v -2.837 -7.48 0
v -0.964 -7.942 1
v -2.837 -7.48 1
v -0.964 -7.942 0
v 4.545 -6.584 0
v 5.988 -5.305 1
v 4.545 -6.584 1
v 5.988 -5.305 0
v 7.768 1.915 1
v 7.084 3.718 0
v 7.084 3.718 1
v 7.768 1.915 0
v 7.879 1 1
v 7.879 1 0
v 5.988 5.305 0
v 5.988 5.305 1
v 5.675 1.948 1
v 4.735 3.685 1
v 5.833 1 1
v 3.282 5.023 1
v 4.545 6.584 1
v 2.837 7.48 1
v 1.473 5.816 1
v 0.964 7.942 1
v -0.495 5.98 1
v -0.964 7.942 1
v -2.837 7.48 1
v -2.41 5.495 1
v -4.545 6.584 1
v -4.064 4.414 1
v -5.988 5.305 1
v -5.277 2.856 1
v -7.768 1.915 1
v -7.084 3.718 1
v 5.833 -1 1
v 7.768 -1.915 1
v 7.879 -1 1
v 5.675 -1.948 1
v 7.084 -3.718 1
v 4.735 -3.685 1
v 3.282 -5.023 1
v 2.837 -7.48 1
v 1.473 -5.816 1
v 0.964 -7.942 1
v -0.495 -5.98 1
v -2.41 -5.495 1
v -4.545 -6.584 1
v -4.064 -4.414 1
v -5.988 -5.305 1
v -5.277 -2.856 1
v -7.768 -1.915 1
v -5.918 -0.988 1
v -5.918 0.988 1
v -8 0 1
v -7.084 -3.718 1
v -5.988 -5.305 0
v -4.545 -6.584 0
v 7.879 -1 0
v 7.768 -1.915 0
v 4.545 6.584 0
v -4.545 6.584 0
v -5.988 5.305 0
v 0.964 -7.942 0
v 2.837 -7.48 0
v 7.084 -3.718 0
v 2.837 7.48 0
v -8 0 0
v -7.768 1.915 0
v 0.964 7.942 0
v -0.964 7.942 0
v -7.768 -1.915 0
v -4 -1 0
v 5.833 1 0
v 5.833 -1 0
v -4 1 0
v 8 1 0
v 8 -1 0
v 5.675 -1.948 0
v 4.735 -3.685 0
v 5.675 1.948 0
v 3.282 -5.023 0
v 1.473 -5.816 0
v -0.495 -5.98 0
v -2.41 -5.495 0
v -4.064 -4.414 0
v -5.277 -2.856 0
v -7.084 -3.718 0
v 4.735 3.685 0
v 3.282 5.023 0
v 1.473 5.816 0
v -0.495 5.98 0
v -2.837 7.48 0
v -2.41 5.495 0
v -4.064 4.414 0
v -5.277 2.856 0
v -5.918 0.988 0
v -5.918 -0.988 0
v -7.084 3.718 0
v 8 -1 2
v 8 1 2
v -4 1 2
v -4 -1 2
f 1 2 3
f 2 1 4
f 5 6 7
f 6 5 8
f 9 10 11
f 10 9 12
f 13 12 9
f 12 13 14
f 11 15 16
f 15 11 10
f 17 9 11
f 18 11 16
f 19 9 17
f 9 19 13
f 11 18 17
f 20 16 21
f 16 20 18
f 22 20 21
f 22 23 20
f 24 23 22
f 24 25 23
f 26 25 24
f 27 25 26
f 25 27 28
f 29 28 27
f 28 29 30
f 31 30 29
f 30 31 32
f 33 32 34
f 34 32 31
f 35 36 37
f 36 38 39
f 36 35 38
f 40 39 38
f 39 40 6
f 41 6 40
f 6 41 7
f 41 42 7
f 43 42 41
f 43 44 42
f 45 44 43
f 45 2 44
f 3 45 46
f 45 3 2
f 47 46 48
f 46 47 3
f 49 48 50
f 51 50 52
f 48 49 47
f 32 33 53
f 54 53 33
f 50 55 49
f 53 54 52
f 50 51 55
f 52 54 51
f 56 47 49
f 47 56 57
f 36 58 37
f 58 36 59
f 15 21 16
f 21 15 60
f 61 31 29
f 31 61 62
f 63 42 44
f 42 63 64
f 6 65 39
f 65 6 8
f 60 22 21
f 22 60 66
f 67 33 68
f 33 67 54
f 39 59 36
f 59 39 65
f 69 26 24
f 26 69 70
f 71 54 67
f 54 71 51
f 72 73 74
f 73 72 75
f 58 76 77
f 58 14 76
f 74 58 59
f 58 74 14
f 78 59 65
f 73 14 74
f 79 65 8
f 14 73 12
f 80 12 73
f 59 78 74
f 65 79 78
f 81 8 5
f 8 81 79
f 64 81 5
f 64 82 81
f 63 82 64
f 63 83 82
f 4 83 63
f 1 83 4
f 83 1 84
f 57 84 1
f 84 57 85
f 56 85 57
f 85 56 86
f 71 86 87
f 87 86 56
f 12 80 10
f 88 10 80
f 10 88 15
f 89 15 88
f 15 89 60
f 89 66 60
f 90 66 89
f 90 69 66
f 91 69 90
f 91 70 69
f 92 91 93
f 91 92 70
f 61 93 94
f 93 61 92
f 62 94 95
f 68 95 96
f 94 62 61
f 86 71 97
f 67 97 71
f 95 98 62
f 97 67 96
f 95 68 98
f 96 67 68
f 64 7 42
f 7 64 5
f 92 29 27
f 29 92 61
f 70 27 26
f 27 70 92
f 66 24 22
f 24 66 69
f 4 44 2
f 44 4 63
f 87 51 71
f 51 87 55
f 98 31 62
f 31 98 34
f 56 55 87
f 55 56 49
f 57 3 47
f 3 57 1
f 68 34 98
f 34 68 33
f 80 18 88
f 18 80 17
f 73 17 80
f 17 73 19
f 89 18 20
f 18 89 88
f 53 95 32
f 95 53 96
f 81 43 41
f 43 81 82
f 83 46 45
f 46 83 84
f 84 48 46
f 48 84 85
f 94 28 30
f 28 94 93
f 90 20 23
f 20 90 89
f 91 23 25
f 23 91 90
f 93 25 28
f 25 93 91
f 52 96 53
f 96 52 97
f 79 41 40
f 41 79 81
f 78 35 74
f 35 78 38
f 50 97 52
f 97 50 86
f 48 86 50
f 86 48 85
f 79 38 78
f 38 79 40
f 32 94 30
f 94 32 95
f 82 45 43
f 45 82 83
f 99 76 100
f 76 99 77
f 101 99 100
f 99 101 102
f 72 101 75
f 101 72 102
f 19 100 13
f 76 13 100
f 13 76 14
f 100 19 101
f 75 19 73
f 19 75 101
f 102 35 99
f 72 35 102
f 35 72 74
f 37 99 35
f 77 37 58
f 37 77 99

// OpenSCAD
//promień wewnętrzny, szerokość obręczy, grubość obręczy, szerokośc pinu, grubość pinu
module wheel_pin(r=6,w=2,d=1,pw=2,pd=2) {
    
    difference() {
        cylinder(d, r+w, r+w);
        cylinder(d, r, r);
    }
    
    translate([-r+w,-pw/2,0]) cube([2*r, pw, pd]);
    
}

wheel_pin();
